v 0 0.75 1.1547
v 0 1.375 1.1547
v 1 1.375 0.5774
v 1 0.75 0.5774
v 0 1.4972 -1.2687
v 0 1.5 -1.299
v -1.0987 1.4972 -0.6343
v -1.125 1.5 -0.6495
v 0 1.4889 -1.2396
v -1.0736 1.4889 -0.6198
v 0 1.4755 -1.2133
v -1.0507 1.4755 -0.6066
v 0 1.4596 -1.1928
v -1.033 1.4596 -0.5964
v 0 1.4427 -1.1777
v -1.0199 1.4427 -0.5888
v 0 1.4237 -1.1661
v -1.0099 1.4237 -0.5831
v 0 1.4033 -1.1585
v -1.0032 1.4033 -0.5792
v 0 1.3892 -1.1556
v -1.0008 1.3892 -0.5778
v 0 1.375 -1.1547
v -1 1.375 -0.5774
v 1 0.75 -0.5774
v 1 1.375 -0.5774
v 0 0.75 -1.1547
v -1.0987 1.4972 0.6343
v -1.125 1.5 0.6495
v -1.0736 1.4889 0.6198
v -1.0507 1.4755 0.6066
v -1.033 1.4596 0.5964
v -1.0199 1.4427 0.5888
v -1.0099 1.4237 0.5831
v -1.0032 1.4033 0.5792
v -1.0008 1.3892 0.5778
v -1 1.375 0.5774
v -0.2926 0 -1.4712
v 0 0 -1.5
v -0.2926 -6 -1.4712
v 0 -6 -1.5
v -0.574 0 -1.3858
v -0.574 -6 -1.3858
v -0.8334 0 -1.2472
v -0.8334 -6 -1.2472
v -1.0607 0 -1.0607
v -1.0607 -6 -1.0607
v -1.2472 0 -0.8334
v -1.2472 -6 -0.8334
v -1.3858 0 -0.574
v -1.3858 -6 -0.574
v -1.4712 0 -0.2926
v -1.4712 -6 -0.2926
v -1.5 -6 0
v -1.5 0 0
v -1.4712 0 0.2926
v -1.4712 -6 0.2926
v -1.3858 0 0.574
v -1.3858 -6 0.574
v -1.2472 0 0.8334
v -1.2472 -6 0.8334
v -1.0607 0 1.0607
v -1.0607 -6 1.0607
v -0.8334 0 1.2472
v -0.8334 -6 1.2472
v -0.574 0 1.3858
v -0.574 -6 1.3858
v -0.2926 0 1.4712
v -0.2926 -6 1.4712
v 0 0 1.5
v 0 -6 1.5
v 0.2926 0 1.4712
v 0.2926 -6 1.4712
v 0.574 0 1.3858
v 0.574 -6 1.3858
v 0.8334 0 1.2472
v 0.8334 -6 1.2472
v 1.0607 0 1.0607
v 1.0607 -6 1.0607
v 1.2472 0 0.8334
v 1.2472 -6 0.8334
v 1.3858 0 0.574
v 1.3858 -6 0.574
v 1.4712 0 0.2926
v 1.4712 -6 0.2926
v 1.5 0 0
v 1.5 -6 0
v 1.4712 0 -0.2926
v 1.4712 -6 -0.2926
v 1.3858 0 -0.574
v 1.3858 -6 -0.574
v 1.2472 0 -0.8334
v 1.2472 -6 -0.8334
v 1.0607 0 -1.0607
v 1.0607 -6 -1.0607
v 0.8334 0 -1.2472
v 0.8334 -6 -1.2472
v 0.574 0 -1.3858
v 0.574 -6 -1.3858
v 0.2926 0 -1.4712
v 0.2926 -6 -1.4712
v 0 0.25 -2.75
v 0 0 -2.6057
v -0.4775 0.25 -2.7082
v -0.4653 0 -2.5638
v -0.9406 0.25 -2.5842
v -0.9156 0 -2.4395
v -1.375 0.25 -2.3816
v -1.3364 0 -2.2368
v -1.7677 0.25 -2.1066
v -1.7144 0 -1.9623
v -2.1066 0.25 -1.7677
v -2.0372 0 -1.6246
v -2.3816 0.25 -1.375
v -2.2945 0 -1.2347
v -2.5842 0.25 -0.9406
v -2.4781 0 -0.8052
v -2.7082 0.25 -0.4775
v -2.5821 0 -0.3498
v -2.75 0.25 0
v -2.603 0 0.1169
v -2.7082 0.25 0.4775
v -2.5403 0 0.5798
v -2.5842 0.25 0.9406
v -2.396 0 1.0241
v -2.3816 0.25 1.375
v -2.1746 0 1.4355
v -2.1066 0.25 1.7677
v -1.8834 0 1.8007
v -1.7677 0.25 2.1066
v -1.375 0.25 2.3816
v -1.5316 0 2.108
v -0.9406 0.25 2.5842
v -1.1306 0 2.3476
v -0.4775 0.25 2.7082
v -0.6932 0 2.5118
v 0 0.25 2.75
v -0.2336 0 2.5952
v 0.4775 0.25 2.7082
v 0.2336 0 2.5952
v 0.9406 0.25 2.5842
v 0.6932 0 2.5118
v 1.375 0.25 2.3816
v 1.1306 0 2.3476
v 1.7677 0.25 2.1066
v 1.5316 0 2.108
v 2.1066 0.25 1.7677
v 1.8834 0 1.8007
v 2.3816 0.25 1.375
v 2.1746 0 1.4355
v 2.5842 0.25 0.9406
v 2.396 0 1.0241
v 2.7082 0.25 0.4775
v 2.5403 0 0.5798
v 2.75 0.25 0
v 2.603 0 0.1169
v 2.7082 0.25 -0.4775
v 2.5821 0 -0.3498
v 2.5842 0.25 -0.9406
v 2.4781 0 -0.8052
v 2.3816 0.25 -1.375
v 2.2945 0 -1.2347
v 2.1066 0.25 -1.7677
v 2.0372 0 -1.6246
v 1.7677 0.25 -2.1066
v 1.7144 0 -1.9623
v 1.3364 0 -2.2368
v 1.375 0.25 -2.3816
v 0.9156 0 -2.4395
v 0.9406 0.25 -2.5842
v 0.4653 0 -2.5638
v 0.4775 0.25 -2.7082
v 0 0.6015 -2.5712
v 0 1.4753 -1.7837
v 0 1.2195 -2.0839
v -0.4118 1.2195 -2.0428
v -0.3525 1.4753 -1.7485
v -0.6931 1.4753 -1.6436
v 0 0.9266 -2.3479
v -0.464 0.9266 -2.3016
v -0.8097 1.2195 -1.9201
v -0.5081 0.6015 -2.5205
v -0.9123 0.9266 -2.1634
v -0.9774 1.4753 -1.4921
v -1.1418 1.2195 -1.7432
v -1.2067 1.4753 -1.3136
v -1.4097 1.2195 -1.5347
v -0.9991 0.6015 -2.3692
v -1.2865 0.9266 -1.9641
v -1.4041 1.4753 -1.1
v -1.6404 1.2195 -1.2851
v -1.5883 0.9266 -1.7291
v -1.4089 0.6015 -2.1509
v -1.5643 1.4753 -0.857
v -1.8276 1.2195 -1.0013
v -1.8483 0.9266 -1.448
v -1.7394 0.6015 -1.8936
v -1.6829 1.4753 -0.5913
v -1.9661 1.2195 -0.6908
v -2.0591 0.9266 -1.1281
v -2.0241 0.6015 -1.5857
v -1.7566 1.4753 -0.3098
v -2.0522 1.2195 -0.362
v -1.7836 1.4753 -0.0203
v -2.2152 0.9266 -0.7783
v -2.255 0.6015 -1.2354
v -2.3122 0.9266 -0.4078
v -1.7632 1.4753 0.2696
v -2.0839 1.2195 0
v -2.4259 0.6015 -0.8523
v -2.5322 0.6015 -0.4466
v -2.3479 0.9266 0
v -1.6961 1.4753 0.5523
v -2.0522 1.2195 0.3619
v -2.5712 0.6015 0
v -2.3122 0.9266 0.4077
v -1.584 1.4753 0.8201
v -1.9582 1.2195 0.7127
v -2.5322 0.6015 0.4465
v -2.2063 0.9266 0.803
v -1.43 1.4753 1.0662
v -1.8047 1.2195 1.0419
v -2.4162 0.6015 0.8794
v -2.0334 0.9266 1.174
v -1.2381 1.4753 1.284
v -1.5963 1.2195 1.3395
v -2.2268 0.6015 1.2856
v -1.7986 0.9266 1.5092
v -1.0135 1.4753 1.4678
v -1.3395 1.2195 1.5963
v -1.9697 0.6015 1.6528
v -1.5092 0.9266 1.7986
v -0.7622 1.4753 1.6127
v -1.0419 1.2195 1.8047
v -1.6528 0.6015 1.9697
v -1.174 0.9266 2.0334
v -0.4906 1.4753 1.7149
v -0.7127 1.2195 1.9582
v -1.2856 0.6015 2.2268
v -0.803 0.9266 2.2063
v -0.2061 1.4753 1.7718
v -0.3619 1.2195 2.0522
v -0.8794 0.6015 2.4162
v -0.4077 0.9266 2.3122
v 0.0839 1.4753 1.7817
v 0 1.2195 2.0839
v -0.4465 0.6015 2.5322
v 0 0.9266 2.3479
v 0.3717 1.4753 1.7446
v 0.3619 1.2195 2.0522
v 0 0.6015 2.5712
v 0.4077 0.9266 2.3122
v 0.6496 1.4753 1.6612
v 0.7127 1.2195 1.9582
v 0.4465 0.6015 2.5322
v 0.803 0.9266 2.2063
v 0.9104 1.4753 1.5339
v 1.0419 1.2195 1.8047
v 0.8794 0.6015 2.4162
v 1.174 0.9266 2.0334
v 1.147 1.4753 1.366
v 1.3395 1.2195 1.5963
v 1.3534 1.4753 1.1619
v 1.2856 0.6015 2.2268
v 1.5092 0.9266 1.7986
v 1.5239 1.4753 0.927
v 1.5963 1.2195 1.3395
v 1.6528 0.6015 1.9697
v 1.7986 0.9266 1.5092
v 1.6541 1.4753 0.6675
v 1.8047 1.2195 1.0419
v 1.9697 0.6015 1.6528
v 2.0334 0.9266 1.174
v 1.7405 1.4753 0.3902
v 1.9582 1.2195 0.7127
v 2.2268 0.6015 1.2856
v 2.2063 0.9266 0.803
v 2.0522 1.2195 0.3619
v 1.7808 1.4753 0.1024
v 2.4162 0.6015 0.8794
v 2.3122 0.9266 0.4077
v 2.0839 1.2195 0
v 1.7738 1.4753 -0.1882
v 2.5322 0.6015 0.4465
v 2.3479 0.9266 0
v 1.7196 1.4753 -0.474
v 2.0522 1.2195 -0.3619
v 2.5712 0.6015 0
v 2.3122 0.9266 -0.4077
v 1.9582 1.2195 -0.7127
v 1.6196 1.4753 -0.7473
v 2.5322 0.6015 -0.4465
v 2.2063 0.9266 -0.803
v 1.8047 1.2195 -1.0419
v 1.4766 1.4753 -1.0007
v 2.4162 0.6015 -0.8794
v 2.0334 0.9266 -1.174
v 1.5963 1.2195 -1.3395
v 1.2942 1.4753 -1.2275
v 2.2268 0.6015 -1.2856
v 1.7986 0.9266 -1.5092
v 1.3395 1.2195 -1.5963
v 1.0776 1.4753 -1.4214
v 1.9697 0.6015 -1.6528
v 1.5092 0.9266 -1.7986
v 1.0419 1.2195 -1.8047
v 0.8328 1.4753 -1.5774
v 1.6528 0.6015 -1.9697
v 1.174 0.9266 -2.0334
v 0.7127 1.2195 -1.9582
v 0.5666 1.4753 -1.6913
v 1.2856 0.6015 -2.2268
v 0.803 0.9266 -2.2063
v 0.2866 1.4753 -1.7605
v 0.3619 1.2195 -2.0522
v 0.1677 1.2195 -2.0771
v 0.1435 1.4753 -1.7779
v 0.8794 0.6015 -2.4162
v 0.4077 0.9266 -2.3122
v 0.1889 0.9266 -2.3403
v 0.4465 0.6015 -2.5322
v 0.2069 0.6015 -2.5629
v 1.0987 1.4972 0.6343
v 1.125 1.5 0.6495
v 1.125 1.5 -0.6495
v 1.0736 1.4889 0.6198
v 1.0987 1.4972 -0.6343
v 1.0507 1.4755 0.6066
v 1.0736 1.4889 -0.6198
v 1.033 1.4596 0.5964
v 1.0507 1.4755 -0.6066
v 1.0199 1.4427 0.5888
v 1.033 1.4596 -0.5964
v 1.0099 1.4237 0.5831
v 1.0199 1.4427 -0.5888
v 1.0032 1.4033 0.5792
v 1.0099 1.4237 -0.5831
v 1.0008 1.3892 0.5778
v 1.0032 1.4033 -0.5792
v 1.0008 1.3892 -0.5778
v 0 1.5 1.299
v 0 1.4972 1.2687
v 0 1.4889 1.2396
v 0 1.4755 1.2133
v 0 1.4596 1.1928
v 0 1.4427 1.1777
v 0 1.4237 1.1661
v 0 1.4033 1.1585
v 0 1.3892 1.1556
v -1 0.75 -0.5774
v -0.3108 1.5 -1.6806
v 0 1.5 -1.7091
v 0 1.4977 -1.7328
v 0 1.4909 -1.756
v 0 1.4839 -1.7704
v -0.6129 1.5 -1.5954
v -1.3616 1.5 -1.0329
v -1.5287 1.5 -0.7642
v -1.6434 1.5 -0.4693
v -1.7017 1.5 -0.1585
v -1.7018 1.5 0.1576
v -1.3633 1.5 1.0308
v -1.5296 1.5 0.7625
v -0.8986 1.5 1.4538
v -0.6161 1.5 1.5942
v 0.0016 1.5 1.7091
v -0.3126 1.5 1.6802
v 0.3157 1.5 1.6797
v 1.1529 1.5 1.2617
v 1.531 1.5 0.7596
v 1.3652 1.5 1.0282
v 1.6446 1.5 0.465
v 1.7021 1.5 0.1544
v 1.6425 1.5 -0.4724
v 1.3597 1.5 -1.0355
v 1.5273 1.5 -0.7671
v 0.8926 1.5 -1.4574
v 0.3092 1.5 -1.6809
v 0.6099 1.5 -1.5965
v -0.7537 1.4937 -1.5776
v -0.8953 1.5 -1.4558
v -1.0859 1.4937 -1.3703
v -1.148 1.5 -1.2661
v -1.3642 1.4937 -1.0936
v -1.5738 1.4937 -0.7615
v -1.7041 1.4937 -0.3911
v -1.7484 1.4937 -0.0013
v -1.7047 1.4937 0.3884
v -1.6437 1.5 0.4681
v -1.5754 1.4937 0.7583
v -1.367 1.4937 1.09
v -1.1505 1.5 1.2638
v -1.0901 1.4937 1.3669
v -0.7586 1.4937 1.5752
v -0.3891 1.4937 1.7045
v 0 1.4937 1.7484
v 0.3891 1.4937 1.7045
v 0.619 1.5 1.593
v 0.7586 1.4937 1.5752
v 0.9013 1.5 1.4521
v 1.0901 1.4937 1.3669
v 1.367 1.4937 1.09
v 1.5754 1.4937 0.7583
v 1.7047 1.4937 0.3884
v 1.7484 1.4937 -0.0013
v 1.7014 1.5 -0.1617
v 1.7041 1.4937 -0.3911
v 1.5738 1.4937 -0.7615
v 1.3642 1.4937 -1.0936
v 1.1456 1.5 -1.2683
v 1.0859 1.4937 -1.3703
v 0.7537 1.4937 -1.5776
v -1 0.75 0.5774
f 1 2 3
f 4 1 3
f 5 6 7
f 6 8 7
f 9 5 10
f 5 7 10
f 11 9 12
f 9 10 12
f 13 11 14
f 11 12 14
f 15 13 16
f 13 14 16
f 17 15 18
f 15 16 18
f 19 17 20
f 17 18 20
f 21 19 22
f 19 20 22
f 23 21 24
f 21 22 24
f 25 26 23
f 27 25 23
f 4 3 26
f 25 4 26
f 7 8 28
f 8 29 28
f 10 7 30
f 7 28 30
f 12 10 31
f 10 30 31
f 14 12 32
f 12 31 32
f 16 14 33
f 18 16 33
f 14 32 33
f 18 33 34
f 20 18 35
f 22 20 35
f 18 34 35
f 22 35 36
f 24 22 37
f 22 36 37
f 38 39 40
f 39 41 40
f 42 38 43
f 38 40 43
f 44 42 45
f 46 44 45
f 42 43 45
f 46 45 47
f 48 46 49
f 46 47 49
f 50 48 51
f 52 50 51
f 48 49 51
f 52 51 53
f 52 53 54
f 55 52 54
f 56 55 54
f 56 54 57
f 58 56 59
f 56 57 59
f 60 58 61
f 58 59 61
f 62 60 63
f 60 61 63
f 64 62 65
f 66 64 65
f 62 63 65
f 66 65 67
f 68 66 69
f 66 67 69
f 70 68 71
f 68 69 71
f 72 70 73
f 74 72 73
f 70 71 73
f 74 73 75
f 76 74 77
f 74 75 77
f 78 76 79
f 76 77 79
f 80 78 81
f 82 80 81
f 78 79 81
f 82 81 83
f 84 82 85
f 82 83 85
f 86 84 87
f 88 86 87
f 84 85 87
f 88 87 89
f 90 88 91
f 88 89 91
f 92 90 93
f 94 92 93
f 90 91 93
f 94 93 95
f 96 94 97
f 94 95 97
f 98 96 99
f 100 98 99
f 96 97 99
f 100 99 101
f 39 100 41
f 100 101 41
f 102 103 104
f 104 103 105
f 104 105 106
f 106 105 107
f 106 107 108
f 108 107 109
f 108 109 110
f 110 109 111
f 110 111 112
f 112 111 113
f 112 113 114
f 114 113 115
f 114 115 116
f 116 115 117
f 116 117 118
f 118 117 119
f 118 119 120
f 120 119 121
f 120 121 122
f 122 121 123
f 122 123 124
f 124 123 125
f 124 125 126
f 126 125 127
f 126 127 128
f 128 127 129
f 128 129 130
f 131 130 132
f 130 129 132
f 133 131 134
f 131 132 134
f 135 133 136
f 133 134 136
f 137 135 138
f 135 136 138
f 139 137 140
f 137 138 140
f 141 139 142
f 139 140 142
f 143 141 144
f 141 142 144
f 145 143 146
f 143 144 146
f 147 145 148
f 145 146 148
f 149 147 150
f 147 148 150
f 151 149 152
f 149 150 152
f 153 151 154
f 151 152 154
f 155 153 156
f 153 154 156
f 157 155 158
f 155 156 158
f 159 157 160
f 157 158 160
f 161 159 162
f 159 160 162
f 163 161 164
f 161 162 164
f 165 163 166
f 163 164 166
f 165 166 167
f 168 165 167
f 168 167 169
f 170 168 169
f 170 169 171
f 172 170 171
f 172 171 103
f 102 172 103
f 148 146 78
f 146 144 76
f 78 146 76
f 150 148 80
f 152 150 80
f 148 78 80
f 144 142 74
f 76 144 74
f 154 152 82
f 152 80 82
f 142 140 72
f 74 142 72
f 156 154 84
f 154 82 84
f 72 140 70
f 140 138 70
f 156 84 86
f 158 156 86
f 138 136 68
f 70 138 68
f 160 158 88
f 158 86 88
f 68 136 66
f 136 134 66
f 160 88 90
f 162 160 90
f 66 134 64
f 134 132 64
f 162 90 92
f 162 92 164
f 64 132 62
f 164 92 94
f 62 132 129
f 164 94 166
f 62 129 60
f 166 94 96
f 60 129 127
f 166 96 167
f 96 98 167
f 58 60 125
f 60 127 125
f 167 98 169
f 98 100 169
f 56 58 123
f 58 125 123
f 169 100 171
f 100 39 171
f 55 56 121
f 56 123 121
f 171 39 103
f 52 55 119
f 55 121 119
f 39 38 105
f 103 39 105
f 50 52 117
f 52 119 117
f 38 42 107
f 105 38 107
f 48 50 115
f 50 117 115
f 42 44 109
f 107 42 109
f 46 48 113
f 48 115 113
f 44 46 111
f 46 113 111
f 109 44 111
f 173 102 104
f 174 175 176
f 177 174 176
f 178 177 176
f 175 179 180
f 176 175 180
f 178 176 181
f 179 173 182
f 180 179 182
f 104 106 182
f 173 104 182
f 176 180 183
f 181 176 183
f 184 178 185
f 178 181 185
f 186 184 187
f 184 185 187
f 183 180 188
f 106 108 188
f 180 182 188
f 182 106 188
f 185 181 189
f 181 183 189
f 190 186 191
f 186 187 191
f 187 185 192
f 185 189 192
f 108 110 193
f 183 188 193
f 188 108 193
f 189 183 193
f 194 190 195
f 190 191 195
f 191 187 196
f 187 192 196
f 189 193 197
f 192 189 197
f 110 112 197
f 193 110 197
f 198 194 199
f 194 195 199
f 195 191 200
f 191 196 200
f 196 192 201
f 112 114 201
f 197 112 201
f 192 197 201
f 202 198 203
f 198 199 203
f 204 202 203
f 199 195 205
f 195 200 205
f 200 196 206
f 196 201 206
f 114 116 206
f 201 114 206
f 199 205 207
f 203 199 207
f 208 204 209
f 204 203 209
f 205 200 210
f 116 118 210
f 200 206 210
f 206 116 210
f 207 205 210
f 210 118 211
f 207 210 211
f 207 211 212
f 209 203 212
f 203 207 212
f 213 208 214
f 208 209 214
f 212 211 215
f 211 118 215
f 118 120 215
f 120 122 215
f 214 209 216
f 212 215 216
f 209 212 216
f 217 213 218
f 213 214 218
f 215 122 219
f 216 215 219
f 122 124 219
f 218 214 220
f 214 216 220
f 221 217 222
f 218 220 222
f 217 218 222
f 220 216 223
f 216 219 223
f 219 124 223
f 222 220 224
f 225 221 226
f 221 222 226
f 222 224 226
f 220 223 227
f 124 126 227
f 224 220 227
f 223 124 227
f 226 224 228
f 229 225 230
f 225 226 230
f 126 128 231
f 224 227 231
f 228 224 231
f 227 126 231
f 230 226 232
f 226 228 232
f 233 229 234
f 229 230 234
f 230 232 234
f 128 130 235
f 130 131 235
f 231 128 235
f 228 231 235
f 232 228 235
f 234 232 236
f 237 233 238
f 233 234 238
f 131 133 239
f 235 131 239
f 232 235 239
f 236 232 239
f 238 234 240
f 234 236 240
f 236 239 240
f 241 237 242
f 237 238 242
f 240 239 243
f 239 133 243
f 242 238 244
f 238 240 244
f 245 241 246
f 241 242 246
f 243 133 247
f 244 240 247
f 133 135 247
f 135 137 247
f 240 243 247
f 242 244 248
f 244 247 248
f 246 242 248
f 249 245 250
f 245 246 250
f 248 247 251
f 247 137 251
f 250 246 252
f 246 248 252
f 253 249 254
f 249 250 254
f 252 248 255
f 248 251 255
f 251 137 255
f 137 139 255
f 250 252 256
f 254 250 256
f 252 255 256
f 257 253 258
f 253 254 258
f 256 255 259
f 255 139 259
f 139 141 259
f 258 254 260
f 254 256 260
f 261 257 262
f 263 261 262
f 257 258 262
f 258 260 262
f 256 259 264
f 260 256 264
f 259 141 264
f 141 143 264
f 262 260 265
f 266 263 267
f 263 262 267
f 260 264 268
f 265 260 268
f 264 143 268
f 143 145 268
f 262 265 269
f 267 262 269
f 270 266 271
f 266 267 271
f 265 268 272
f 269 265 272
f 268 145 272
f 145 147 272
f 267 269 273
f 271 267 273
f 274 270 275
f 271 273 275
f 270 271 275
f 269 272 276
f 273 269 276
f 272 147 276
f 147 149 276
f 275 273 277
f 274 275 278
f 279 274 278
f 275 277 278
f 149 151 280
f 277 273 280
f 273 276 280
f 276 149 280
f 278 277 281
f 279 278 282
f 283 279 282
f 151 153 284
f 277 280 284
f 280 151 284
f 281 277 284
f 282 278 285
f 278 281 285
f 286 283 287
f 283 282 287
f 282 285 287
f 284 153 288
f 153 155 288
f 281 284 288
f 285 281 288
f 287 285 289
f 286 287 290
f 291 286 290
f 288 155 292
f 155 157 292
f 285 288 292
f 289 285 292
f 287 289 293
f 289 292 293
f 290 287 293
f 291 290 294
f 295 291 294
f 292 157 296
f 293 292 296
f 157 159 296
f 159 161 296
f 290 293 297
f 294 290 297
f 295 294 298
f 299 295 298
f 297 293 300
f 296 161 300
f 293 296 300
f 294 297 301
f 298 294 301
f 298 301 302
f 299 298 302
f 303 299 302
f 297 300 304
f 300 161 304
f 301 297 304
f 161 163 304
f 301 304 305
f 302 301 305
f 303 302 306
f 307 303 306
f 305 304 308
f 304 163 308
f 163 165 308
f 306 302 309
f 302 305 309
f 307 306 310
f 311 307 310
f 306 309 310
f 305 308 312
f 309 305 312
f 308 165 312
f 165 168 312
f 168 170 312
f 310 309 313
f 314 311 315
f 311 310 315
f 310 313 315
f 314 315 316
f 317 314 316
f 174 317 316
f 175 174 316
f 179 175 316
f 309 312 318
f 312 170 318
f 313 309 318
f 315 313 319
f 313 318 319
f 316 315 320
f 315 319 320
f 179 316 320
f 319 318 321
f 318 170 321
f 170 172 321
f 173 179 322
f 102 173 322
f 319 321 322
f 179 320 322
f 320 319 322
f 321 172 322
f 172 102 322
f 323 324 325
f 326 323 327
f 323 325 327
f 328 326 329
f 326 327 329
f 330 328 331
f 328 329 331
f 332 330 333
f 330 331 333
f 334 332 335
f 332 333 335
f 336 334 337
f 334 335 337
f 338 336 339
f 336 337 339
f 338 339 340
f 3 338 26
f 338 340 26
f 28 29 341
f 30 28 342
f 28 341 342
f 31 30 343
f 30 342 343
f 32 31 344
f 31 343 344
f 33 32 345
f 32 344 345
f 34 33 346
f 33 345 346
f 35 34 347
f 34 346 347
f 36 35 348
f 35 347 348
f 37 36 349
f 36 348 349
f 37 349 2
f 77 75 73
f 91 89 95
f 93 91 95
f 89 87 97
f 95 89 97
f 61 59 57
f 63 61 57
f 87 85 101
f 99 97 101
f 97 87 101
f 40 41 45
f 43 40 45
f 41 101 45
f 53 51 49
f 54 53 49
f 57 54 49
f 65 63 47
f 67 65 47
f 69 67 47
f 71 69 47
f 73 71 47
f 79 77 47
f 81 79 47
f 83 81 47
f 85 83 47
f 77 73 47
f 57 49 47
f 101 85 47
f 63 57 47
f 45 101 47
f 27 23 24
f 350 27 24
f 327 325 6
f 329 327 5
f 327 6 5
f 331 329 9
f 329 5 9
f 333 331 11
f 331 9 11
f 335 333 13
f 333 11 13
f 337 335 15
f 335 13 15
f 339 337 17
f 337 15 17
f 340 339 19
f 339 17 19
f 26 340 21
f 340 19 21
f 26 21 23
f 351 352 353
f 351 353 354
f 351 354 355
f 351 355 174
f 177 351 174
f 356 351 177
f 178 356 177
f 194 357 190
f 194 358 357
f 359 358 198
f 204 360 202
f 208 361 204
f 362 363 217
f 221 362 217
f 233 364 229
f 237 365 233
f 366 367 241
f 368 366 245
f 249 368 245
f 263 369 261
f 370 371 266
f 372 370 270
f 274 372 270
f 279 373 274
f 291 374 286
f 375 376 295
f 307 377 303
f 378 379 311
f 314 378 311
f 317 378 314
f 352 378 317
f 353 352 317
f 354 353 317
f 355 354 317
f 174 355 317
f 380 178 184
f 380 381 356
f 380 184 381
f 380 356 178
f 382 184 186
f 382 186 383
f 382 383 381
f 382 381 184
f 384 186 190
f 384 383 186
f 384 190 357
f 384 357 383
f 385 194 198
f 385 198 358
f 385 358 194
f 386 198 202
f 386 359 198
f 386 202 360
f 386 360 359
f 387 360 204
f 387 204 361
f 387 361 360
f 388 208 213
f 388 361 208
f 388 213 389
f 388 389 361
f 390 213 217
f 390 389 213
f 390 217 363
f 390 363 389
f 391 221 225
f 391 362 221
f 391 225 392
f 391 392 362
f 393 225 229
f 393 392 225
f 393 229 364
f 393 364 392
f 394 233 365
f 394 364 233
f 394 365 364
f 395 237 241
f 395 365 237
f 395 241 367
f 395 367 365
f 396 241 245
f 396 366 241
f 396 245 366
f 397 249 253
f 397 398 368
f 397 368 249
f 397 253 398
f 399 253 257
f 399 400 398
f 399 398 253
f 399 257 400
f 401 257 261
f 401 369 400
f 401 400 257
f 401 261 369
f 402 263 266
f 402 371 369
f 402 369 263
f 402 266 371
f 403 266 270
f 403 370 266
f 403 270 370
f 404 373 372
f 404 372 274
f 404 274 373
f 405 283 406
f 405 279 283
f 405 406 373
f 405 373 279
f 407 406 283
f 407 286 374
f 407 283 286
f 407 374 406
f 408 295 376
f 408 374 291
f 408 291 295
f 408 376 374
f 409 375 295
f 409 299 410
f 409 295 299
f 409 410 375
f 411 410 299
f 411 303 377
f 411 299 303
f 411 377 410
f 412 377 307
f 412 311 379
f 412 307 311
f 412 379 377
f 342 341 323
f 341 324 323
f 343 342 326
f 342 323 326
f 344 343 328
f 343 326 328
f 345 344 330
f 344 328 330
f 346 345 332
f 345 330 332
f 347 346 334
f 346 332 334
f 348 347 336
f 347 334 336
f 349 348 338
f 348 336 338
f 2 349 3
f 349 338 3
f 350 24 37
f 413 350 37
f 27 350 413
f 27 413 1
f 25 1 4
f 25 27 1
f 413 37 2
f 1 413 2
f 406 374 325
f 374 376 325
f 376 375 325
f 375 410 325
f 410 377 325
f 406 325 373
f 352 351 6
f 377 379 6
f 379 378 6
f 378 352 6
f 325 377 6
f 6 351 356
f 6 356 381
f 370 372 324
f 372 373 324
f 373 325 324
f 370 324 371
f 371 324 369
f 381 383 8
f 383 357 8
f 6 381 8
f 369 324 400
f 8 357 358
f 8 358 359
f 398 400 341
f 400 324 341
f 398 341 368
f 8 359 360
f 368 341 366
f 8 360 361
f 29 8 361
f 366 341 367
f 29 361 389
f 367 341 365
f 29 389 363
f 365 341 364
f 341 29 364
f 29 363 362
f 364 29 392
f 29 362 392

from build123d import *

# Parameters (mm, degrees)
CUT_EXTRUDE1_DEPTH = 0.75
FILLET1_R          = 0.125


with BuildPart() as part:
    # Sketch1 → Revolve1 (revolve)
    with BuildSketch(Plane(origin=(0, 0, 0), x_dir=(0, 0, -1), z_dir=(1, 0, 0)), mode=Mode.PRIVATE) as revolve1_sk:
        with BuildLine():
            Line((0, 1.5), (-1.75, 1.5))
            ThreePointArc((-1.75, 1.5), (-2.334912942, 0.942930354), (-2.75, 0.25))
            Line((-2.75, 0.25), (-2.605662433, 0))
            Line((-2.605662433, 0), (-1.5, 0))
            Line((-1.5, 0), (-1.5, -6))
            Line((-1.5, -6), (0, -6))
            Line((0, -6), (0, 1.5))
        make_face()
    revolve(revolve1_sk.sketch.rotate(Axis((0, -6, 0), (0, 1, 0)), 180), axis=Axis((0, -6, 0), (0, 1, 0)))

    # Sketch2 → Cut-Extrude1 (cut)
    with BuildSketch(Plane(origin=(0, 1.5, 0), x_dir=(1, 0, 0), z_dir=(0, 1, 0))):
        Polygon((0, 1.154700538), (-1, 0.577350269), (-1, -0.577350269), (0, -1.154700538), (1, -0.577350269), (1, 0.577350269), align=None)
    extrude(amount=-CUT_EXTRUDE1_DEPTH, mode=Mode.SUBTRACT)

    # Fillet1
    fillet1_edges = [part.edges().sort_by_distance(p)[0] for p in [
        (0.5, 1.5, -0.866025404),
        (-0.5, 1.5, -0.866025404),
        (-1, 1.5, 0),
        (-0.5, 1.5, 0.866025404),
        (0.5, 1.5, 0.866025404),
        (1, 1.5, 0),
        (0, 1.5, 1.75),
    ]]
    fillet(fillet1_edges, radius=FILLET1_R)


solid = part.part
